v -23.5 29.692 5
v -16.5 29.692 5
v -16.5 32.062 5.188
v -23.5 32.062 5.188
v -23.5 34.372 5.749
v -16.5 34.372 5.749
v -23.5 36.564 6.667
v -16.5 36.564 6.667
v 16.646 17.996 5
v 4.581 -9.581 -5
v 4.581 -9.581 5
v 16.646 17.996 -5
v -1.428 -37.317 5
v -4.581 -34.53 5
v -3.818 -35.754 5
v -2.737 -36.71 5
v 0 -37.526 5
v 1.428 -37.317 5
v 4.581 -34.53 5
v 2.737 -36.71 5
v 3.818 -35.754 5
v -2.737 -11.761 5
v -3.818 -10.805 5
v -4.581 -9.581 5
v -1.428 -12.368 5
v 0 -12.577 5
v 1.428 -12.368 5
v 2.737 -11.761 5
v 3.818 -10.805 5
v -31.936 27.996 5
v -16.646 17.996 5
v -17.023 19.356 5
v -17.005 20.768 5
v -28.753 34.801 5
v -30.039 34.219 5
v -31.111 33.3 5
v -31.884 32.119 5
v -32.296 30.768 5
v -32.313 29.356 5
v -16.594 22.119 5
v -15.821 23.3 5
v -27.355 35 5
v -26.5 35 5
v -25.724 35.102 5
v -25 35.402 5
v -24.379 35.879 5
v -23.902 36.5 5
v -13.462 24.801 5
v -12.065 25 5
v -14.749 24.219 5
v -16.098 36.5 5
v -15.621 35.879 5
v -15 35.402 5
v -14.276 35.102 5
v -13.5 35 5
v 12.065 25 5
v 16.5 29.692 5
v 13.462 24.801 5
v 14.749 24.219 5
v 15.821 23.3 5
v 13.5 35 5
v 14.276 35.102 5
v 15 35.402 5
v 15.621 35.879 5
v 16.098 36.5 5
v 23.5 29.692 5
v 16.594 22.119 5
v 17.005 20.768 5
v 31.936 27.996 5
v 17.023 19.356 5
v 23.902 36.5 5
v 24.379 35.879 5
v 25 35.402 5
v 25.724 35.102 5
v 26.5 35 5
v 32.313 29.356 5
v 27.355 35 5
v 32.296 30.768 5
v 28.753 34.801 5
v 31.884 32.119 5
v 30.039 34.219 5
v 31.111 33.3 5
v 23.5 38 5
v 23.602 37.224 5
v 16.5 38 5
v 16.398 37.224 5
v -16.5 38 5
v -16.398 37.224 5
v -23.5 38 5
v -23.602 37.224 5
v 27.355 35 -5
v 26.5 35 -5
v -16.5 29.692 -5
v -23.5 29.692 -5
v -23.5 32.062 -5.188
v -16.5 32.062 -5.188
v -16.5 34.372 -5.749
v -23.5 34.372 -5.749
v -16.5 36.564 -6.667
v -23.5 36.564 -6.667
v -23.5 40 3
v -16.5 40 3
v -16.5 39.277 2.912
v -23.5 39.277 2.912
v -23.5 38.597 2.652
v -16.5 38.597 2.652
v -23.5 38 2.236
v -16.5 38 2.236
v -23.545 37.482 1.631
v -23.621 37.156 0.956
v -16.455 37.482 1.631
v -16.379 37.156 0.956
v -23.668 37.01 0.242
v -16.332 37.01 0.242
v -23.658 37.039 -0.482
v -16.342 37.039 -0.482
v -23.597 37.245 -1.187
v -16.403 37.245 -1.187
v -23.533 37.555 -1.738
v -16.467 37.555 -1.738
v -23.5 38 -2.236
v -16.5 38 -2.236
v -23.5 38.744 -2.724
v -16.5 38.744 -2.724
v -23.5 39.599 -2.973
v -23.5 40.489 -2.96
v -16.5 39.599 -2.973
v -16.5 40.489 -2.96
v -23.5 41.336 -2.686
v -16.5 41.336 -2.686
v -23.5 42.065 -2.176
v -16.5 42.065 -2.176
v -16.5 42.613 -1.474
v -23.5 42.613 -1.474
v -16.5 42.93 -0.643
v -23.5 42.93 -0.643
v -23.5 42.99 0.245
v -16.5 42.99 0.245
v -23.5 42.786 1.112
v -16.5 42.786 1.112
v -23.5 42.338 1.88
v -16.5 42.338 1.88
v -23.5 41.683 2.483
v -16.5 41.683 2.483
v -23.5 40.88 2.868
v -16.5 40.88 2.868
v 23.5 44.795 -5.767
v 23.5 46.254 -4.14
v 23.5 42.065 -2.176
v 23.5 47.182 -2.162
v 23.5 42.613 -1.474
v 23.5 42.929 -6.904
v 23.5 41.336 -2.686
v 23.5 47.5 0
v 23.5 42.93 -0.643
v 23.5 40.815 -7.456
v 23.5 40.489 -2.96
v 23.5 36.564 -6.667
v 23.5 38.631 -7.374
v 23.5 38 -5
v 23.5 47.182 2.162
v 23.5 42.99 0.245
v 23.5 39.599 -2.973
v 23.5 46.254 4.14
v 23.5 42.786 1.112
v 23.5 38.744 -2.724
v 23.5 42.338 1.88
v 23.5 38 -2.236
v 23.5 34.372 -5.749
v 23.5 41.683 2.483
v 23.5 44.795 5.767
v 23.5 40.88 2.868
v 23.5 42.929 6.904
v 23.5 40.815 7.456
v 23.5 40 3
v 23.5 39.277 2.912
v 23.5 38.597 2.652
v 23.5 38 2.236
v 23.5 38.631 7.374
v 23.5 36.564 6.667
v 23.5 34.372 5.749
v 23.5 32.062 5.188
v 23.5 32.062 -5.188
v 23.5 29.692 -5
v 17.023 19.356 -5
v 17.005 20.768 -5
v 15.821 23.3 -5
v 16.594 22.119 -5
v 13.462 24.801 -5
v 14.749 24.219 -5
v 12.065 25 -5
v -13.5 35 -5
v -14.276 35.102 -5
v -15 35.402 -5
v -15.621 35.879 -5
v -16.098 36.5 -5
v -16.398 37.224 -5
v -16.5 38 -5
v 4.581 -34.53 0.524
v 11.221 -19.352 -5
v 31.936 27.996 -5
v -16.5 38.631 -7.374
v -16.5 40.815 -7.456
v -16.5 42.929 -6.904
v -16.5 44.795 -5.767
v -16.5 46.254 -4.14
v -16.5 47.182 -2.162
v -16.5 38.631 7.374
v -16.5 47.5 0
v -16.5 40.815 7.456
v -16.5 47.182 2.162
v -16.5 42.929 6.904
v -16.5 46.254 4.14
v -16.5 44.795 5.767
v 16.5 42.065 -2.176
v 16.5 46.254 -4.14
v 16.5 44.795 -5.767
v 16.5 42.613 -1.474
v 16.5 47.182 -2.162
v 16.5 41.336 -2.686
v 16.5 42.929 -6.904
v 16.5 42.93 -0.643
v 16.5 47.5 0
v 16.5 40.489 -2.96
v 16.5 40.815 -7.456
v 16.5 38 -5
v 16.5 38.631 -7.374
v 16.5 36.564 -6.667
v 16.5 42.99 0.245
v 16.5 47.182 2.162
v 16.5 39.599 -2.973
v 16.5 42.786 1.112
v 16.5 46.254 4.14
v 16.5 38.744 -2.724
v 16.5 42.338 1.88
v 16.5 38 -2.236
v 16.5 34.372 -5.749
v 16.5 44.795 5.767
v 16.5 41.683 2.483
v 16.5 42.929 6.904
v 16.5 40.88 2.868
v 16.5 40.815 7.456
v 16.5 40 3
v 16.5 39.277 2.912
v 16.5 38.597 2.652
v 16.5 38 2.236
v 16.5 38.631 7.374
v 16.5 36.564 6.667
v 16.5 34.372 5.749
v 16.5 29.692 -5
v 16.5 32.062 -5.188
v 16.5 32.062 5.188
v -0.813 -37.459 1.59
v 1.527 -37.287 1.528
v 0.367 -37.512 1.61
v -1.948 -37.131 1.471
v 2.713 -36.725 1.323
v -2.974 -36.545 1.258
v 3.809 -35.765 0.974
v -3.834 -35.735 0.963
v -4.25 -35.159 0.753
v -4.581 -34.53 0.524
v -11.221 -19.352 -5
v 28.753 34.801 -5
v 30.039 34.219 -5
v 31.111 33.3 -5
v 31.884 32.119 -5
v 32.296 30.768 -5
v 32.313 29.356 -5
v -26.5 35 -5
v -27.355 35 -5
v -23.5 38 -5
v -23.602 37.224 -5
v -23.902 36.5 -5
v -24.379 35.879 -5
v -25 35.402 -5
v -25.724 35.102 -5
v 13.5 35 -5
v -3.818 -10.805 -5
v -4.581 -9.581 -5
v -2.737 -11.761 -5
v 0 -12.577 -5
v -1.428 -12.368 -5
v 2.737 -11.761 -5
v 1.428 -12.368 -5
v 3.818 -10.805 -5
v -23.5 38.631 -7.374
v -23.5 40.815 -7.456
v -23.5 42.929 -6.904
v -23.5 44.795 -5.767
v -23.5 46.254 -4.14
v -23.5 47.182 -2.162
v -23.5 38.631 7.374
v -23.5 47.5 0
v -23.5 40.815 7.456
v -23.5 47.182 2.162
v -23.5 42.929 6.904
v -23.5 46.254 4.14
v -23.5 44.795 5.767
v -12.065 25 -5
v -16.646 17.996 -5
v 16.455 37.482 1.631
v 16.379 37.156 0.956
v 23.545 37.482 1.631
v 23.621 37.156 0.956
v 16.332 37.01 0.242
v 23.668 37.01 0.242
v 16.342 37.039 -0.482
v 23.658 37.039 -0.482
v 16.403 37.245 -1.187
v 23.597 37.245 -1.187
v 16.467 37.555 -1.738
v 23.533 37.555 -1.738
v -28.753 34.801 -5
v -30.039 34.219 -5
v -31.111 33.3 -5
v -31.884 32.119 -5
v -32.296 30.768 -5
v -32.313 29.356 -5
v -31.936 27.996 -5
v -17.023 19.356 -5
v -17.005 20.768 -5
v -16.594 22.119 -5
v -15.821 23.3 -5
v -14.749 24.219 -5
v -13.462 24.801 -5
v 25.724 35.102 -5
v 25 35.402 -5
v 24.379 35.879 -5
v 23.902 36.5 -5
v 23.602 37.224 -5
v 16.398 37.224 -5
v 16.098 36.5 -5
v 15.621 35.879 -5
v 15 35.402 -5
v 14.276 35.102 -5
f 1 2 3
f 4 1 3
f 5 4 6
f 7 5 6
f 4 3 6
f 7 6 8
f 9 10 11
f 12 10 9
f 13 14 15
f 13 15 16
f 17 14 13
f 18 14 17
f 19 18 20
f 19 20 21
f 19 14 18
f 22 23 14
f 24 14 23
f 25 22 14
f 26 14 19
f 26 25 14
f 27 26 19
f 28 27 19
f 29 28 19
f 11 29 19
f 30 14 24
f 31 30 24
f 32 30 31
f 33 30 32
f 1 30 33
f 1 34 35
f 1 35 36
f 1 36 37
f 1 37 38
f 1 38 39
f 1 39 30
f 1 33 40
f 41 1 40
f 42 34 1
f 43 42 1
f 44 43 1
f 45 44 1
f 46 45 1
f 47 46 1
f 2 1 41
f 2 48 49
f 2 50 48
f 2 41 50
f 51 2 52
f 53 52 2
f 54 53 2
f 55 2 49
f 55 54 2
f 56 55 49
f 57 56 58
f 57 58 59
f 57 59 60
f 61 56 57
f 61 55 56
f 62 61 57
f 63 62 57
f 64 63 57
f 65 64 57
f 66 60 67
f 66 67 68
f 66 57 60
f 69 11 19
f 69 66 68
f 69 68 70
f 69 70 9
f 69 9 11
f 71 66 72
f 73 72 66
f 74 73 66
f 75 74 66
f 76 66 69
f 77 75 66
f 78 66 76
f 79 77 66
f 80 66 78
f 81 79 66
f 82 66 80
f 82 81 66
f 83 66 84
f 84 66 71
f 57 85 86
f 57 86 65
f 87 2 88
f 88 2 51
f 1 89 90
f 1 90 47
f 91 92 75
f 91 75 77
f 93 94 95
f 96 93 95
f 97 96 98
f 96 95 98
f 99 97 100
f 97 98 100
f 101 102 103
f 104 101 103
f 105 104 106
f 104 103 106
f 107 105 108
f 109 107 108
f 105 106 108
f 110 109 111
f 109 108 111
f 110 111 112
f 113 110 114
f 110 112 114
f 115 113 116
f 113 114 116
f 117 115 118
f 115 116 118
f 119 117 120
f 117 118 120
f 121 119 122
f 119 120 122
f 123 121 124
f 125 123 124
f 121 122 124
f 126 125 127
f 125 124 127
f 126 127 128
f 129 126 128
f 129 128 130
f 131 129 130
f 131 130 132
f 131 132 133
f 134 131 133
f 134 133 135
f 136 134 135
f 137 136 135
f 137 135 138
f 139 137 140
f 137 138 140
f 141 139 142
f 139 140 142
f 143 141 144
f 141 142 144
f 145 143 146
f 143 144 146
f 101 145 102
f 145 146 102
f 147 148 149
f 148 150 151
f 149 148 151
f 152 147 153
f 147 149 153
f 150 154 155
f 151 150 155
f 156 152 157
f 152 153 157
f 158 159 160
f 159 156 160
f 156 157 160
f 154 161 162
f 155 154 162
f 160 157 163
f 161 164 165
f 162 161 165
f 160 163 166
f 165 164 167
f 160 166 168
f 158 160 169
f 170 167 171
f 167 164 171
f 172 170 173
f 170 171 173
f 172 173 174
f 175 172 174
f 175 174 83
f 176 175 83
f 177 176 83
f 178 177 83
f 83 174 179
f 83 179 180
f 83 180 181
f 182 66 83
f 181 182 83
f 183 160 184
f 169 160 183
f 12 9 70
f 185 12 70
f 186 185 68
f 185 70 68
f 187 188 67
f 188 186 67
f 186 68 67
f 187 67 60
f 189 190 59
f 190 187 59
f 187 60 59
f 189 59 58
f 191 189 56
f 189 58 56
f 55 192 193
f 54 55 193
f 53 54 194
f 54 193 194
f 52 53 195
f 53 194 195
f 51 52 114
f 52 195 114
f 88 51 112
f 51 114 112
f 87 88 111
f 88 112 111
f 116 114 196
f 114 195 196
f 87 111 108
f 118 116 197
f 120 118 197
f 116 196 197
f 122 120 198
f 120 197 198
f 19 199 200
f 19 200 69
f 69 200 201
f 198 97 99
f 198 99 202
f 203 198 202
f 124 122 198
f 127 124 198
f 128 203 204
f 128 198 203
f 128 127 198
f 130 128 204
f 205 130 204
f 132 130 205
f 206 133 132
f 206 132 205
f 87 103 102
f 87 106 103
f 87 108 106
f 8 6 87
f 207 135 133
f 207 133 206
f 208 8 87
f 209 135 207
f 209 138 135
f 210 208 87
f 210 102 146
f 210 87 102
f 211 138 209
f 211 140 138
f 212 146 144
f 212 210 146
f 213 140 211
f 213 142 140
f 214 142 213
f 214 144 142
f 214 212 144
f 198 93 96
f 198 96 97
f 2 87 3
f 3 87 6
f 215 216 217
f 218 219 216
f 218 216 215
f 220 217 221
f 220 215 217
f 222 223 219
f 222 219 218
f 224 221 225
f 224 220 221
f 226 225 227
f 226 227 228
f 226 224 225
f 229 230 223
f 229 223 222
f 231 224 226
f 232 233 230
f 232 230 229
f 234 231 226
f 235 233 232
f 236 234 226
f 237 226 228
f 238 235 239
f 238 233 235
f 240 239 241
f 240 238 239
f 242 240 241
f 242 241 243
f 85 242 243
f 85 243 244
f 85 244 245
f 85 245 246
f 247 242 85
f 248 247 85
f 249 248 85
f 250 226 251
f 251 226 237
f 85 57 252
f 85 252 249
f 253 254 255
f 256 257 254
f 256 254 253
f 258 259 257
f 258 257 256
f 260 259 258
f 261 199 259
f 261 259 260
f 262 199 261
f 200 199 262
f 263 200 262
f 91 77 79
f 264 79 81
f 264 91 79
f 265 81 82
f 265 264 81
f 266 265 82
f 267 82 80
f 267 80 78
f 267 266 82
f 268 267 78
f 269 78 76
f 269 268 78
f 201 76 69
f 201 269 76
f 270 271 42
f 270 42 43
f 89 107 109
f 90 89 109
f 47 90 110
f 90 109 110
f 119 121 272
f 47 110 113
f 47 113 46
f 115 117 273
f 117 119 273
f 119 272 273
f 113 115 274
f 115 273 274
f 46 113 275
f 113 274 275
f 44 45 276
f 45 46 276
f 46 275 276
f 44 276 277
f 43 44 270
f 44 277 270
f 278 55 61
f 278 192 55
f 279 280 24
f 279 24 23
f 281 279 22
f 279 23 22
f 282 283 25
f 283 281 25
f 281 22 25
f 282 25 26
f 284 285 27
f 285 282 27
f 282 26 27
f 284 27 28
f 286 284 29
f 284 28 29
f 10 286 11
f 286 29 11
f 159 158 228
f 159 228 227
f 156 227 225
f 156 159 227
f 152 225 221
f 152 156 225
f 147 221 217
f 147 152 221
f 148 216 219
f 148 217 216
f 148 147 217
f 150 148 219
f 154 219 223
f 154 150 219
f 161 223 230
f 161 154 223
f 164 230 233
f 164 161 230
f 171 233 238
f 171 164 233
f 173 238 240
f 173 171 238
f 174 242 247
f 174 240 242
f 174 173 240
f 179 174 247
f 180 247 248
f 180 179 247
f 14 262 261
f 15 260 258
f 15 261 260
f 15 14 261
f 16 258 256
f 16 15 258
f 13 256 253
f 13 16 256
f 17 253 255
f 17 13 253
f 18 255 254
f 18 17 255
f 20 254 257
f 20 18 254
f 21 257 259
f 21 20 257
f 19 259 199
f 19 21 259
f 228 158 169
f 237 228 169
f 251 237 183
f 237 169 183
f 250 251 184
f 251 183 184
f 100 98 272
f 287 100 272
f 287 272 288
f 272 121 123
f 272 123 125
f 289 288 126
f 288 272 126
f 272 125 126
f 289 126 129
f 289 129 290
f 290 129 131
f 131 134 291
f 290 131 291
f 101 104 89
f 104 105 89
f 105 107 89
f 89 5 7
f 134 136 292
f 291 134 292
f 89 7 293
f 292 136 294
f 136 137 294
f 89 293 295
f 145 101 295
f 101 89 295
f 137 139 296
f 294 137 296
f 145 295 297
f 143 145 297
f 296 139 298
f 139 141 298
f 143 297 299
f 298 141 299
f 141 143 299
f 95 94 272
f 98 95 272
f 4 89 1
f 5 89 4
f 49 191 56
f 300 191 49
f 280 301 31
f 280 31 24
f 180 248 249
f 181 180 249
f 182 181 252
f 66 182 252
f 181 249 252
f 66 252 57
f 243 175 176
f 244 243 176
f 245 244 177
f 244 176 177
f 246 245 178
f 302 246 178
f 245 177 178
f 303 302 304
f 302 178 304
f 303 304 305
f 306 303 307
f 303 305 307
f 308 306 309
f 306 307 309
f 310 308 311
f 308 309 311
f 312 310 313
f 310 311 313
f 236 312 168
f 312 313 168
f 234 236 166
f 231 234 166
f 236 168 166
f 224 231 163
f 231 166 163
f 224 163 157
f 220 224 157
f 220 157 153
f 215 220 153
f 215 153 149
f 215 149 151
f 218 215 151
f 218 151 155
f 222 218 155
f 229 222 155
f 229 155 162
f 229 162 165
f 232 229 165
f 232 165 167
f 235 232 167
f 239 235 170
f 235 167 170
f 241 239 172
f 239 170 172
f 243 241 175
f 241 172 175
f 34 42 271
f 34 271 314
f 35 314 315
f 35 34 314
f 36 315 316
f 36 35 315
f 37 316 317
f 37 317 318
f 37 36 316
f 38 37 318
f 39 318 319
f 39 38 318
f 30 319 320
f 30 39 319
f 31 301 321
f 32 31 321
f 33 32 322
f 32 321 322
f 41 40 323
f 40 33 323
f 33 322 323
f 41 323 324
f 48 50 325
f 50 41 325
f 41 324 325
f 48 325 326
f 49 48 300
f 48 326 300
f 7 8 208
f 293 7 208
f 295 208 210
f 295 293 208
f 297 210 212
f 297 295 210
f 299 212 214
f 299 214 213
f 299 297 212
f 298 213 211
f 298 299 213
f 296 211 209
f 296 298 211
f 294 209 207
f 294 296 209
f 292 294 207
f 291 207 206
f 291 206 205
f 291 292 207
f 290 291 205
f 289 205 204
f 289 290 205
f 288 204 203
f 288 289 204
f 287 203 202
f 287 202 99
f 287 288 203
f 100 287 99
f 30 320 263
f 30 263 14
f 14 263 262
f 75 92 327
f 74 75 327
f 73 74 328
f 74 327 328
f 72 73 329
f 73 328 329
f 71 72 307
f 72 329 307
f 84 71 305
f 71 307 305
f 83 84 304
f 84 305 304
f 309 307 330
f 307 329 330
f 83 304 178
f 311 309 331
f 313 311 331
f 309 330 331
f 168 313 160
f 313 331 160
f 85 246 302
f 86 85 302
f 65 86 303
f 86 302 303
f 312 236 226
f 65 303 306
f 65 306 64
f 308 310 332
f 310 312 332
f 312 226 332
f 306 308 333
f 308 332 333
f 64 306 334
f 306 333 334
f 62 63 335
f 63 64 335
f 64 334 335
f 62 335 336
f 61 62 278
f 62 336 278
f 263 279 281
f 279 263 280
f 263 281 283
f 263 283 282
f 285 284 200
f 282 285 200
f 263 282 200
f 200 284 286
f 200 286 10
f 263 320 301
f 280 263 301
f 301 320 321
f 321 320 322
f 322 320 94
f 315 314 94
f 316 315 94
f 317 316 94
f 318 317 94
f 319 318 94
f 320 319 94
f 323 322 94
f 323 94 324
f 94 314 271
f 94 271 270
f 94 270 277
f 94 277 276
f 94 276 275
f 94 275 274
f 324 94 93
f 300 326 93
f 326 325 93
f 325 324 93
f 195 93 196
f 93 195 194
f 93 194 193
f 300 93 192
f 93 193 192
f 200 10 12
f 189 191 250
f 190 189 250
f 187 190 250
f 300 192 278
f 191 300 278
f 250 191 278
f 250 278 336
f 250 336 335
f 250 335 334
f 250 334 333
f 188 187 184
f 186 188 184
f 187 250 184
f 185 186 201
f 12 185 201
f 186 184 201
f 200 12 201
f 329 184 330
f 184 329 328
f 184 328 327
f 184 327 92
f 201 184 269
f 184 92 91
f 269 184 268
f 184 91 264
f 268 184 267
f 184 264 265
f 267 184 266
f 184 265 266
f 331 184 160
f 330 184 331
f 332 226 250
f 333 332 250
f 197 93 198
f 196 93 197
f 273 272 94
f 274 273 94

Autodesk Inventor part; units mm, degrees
ref_plane "XZ Plane" through (0, 0, 0) normal (0, 1, 0) x (-1, 0, 0)
sketch "Náčrt1" plane through (0, 0, 0) normal (0, 0, 1) x (1, 0, 0)
  line L0 (-35, 35) -> (35, 35)
  line L1 (-35, 35) -> (0, -45)
  line L2 (0, -45) -> (35, 35)
  line L3 (0, 51) -> (0, -61) projected
  line L4 (-49, 0) -> (49, 0) projected
  line L5 (19.7098, 25) -> (-19.7098, 25)
  line L6 (-19.7098, 25) -> (0, -20.0511)
  line L7 (0, -20.0511) -> (19.7098, 25)
  point P0 (0, 0)
  dimension "d3" = 70
  dimension "d36" = 80
  dimension "d37" = 35
  dimension "d38" = 10
extrude "Vysunutí1" add sketch "Náčrt1" along normal mid plane 10 contours L0 L3 L5 L6 L4 L1 | L0 L2 L4 L7 L5 L3 | L4 L6 L3 L1 | L3 L7 L4 L2
fillet "Zaoblení1" radius 5 6 edges at (-35, 35, 0) (35, 35, 0) (0, -45, 0) (0, -20.0511, 0) (-19.7098, 25, 0) (19.7098, 25, 0)
ref_plane "Pracovní rovina1" through (20, 0, 0) normal (1, 0, 0) x (0, 1, 0)
ref_plane "Pracovní rovina2" through (-20, 0, 0) normal (1, 0, 0) x (0, 1, 0)
sketch "Náčrt3" plane through (20, 0, 0) normal (1, 0, 0) x (0, 1, 0)
  line L0 (45, -5) -> (30, -5)
  line L1 (30, -5) -> (30, 5)
  line L2 (30, 5) -> (45, 5)
  line L3 (45, 5) -> (45, -5)
  line L4 (35, 5) -> (35, -5) projected
  point P0 (0, 0)
  dimension "d18" = 15
  dimension "d19" = 10
  dimension "d20" = 10
sketch "Náčrt4" plane through (-20, 0, 0) normal (1, 0, 0) x (0, 1, 0)
  line L0 (35, -5) -> (27.9959, -5) projected
  line L1 (27.9959, -5) -> (27.9959, 5) projected
  line L2 (27.9959, 5) -> (35, 5) projected
  line L3 (35, 5) -> (35, -5) projected
  circle A0 centre (40, 0) radius 7.5
  point P0 (0, 0)
  point P1 (34.4098, -5)
  point P2 (34.4098, 5)
  dimension "d61" = 15
extrude "Vysunutí2" add sketch "Náčrt4" along normal mid plane 7
fillet "Zaoblení2" radius 3 2 edges at (-16.5, 35, 0) (-23.5, 35, 0)
ref_plane "Pracovní rovina7" through (23.5, 0, 0) normal (1, 0, 0) x (0, 0, -1)
sketch "Náčrt8" plane through (0, 0, 0) normal (1, 0, 0) x (0, 1, 0)
  line L0 (-54.0306, 0) -> (61.5051, 0) projected
  line L1 (0, 7) -> (0, -7) projected
  line L2 (27.9959, 5) -> (-34.5296, 5) projected
  arc A0 (38, -2.2361) -> (38, 2.2361) centre (40, 0) ccw projected
  line L3 (40, 0) -> (31.4495, 23.4923)
  line L4 (31.4495, 23.4923) -> (-33.0951, 0)
  line L5 (-33.0951, 0) -> (40, 0)
  line L6 (0, -7) -> (0, 7)
  line L7 (27.9959, -5) -> (-34.5296, -5)
  arc A1 (38, -2.2361) -> (38, 2.2361) centre (40, 0) ccw
  line L8 (40, 0) -> (31.4495, -23.4923)
  line L9 (31.4495, -23.4923) -> (-33.0951, 0)
  point P0 (0, 0)
  point P1 (-19.3577, 5)
  point P2 (0, 5)
  point P3 (0, -5)
  point P4 (-19.3577, -5)
  dimension "d47" = 25
  dimension "d48" = 20
  dimension "d49" = 90
  dimension "d50" = 0
ref_plane "Pracovní rovina6" through (10, 31.4495, -23.4923) normal (0, -0.342, -0.9397) x (-1, 0, 0)
sketch "Náčrt10" plane through (10, 31.4495, -23.4923) normal (0, -0.342, -0.9397) x (-1, 0, 0)
  line L0 (-47.61, -16.3764) -> (81.0156, -16.3764)
  line L1 (81.0156, -16.3764) -> (81.0156, -106.6518)
  line L2 (81.0156, -106.6518) -> (-47.61, -106.6518)
  line L3 (-47.61, -106.6518) -> (-47.61, -16.3764)
  point P0 (10, -37.5877)
extrude "Vysunutí8" cut sketch "Náčrt10" along normal blind 10
fillet "Zaoblení3" radius 15 2 edges at (-20, 34.4098, -5) (-20, 34.4098, 5)
mirror "Zrcadlit1" about plane through (0, 0, 0) normal (1, 0, 0) of "Vysunutí2", "Zaoblení2", "Zaoblení3"
sketch "Náčrt5" plane through (23.5, 0, 0) normal (1, 0, 0) x (0, 0, -1)
  line L0 (5, 35) -> (5, 45) projected
  line L1 (5, 45) -> (-5, 45) projected
  line L2 (-5, 45) -> (-5, 35) projected
  line L3 (5, 35) -> (-5, 35) projected
  point P0 (0, 0)
  point P1 (0, 40)
hole "Díra1" at (23.5, 40, 0) direction (1, 0, 0) diameter 6 end through all both
properties part number "trojúhleník_FF"
